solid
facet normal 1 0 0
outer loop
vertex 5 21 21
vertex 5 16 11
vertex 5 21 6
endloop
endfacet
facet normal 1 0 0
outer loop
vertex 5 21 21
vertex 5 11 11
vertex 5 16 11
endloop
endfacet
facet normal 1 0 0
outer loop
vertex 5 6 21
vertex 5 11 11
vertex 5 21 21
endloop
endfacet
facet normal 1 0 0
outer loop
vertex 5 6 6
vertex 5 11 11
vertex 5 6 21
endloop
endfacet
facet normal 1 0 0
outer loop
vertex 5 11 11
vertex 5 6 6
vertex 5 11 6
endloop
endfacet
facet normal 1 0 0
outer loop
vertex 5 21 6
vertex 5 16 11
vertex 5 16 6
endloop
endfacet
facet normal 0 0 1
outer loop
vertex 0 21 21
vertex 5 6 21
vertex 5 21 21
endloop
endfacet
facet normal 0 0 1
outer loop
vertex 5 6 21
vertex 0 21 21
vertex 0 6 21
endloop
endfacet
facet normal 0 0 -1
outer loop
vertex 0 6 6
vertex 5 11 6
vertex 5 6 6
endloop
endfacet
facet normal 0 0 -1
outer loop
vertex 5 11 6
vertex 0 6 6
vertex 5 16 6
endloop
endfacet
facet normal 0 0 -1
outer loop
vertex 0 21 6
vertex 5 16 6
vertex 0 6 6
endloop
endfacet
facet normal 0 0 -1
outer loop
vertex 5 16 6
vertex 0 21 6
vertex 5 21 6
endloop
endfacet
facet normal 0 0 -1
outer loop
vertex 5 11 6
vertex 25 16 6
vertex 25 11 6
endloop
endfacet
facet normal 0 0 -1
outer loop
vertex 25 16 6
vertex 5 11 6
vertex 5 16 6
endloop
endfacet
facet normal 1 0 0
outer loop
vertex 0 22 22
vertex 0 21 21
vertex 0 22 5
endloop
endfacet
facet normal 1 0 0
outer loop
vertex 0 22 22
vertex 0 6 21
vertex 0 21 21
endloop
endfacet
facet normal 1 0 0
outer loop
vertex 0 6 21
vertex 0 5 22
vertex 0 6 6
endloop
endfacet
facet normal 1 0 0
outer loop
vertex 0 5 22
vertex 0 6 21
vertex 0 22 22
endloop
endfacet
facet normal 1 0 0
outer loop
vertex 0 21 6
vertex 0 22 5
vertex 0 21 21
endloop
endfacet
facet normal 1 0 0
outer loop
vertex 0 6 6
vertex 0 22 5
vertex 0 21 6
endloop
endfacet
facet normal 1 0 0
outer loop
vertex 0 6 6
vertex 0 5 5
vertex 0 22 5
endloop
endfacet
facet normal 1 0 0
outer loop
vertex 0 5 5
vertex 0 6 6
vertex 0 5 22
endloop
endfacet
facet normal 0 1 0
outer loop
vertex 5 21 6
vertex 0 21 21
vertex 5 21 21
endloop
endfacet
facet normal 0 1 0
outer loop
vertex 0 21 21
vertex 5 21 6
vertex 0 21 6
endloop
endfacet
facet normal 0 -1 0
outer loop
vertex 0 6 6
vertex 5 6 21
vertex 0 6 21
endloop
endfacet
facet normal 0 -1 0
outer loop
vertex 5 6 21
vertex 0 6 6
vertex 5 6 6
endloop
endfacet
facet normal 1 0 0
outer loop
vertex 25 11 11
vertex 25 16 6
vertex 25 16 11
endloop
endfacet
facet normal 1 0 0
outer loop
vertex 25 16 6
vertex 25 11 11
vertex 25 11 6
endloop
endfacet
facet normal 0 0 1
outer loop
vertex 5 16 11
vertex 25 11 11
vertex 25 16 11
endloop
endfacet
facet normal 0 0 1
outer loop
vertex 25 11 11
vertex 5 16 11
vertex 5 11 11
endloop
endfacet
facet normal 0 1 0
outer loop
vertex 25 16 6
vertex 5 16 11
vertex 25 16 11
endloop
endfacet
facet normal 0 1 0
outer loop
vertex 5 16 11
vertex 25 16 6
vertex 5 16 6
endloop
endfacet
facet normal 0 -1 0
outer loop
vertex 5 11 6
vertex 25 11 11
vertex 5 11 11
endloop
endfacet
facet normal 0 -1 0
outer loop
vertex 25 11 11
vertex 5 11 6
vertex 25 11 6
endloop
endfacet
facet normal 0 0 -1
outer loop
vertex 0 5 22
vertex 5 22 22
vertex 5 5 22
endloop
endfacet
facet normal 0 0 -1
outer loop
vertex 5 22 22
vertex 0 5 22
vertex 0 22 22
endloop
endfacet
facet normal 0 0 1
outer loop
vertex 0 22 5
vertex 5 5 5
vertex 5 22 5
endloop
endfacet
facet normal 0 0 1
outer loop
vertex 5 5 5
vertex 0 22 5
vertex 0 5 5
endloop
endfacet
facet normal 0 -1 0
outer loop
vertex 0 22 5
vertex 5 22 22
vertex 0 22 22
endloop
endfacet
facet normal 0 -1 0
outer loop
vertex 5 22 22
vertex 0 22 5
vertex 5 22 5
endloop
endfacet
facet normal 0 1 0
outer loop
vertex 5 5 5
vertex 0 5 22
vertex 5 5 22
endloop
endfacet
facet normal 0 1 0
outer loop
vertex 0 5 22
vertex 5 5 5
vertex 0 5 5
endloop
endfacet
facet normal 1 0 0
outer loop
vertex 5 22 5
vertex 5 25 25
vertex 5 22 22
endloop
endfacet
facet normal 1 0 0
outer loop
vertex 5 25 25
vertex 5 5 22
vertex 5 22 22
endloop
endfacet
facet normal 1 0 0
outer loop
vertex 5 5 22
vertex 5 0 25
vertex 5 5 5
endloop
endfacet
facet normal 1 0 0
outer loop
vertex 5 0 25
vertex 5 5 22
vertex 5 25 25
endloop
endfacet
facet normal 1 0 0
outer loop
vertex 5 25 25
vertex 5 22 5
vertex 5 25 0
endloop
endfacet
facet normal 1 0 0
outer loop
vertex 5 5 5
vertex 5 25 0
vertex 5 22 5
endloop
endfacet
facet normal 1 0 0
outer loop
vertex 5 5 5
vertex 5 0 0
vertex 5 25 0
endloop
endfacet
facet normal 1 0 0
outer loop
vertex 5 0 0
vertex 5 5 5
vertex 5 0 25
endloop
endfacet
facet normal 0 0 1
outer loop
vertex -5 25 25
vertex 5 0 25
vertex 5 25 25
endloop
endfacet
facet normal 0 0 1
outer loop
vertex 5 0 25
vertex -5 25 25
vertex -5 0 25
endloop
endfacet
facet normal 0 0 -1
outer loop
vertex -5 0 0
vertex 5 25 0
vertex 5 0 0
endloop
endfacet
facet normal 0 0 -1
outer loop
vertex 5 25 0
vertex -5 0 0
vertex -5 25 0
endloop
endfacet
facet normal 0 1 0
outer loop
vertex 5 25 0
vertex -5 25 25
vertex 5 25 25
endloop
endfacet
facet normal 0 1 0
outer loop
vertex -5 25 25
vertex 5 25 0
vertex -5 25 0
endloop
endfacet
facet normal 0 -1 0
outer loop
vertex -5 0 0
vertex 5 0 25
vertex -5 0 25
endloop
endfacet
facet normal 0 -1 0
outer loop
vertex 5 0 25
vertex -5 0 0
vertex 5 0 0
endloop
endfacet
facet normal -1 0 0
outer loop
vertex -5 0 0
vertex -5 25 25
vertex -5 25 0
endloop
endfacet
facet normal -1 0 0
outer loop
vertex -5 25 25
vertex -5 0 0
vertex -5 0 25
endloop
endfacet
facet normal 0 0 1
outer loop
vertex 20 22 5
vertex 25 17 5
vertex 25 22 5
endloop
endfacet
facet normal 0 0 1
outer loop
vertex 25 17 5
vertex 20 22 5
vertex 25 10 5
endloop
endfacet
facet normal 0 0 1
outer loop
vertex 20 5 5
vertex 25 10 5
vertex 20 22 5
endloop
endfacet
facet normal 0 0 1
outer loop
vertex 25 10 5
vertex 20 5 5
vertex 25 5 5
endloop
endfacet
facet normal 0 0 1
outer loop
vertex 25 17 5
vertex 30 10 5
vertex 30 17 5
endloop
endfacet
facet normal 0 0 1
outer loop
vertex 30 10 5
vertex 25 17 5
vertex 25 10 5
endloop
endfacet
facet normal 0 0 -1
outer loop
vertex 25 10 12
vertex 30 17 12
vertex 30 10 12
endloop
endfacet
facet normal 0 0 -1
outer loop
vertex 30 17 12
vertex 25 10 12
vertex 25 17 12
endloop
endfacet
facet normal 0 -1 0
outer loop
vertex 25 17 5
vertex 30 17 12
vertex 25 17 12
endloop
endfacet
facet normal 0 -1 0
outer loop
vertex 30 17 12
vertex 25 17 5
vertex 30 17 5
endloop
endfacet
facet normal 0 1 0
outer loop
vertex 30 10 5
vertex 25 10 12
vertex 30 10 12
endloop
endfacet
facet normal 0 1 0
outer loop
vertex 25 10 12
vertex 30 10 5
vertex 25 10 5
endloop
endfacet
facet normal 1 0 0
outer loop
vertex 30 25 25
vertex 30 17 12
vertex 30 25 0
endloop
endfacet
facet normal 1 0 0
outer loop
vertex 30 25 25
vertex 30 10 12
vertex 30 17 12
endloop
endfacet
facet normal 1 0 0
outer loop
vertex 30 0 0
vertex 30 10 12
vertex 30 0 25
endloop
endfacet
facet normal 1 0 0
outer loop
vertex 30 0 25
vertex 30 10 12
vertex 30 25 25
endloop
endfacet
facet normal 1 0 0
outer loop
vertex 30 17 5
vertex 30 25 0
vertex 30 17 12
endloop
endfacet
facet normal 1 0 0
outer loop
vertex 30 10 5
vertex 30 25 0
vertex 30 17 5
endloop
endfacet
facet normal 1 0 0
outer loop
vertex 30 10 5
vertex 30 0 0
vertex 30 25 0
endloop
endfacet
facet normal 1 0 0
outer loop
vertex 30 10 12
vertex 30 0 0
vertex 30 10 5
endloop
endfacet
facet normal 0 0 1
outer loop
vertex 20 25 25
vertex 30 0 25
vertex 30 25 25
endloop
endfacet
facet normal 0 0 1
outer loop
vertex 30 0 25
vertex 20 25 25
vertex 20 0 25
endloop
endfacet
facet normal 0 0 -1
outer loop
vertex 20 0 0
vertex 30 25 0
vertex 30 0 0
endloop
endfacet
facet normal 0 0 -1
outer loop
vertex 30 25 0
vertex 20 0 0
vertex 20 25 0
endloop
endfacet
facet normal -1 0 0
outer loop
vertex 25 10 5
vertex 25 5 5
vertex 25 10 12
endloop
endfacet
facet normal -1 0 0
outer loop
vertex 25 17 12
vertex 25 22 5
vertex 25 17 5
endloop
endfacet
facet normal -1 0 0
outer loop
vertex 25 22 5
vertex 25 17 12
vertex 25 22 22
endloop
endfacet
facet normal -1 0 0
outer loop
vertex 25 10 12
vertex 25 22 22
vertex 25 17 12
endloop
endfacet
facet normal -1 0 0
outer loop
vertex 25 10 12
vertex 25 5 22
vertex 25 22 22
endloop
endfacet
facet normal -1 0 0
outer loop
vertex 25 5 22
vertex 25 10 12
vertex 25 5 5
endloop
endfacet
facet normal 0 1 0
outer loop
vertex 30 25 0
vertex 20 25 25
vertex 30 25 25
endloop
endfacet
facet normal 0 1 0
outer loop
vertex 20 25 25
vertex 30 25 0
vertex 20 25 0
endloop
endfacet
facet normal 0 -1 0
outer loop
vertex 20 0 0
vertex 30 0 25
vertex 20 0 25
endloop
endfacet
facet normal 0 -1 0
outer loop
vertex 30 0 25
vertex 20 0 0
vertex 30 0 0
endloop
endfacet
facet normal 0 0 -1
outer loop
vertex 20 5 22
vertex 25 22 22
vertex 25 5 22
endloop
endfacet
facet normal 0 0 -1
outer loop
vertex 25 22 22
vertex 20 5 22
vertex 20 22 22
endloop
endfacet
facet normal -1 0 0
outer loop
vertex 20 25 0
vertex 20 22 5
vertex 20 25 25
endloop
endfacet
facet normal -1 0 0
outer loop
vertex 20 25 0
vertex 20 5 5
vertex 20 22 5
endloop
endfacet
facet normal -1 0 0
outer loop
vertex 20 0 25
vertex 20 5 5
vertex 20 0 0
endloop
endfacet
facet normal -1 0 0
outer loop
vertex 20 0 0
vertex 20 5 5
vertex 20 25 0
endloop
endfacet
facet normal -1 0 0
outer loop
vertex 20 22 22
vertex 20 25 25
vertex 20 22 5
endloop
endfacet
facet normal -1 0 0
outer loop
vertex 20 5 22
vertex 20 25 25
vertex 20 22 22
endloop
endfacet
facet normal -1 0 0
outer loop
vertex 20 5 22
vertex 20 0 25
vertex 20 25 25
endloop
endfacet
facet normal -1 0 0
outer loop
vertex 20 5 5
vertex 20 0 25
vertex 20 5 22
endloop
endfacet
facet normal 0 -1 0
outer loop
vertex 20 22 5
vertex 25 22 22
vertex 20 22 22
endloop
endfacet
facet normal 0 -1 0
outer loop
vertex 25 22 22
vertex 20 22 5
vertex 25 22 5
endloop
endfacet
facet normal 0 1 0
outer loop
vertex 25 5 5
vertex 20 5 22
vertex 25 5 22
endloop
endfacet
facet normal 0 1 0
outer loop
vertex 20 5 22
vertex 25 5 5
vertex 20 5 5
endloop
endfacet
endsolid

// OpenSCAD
module pin(t,w,d,h){//uncapped tail
    union(){
        cube([t,d+2*t, h+2*t]);
        translate([t,t,0]) cube([w,d,h]);
    }
}

translate([0,6,6]) pin(5,20,5,5);

module walls(t,w,d,h,s){
    union(){
    difference(){//head
        cube([t,d+4*t,h+4*t]);
        translate([0,t,t]) pin(t+s,w,d,h);
    }
    translate([-t,0,0]) cube([t,d+4*t,h+4*t]);
    }
    union(){
    difference(){//pin
        translate([w+t,0,0]) cube([t,d+4*t,h+4*t]);
        translate([t,t-s,t]) pin(t+s,w,d+2*s,h+2*s);
    }
    translate([w,0,0]) difference(){//head
        cube([t,d+4*t,h+4*t]);
        translate([0,t,t]) pin(t+s,w,d,h);
    }
    }
}

walls(5,20,5,5,1);
